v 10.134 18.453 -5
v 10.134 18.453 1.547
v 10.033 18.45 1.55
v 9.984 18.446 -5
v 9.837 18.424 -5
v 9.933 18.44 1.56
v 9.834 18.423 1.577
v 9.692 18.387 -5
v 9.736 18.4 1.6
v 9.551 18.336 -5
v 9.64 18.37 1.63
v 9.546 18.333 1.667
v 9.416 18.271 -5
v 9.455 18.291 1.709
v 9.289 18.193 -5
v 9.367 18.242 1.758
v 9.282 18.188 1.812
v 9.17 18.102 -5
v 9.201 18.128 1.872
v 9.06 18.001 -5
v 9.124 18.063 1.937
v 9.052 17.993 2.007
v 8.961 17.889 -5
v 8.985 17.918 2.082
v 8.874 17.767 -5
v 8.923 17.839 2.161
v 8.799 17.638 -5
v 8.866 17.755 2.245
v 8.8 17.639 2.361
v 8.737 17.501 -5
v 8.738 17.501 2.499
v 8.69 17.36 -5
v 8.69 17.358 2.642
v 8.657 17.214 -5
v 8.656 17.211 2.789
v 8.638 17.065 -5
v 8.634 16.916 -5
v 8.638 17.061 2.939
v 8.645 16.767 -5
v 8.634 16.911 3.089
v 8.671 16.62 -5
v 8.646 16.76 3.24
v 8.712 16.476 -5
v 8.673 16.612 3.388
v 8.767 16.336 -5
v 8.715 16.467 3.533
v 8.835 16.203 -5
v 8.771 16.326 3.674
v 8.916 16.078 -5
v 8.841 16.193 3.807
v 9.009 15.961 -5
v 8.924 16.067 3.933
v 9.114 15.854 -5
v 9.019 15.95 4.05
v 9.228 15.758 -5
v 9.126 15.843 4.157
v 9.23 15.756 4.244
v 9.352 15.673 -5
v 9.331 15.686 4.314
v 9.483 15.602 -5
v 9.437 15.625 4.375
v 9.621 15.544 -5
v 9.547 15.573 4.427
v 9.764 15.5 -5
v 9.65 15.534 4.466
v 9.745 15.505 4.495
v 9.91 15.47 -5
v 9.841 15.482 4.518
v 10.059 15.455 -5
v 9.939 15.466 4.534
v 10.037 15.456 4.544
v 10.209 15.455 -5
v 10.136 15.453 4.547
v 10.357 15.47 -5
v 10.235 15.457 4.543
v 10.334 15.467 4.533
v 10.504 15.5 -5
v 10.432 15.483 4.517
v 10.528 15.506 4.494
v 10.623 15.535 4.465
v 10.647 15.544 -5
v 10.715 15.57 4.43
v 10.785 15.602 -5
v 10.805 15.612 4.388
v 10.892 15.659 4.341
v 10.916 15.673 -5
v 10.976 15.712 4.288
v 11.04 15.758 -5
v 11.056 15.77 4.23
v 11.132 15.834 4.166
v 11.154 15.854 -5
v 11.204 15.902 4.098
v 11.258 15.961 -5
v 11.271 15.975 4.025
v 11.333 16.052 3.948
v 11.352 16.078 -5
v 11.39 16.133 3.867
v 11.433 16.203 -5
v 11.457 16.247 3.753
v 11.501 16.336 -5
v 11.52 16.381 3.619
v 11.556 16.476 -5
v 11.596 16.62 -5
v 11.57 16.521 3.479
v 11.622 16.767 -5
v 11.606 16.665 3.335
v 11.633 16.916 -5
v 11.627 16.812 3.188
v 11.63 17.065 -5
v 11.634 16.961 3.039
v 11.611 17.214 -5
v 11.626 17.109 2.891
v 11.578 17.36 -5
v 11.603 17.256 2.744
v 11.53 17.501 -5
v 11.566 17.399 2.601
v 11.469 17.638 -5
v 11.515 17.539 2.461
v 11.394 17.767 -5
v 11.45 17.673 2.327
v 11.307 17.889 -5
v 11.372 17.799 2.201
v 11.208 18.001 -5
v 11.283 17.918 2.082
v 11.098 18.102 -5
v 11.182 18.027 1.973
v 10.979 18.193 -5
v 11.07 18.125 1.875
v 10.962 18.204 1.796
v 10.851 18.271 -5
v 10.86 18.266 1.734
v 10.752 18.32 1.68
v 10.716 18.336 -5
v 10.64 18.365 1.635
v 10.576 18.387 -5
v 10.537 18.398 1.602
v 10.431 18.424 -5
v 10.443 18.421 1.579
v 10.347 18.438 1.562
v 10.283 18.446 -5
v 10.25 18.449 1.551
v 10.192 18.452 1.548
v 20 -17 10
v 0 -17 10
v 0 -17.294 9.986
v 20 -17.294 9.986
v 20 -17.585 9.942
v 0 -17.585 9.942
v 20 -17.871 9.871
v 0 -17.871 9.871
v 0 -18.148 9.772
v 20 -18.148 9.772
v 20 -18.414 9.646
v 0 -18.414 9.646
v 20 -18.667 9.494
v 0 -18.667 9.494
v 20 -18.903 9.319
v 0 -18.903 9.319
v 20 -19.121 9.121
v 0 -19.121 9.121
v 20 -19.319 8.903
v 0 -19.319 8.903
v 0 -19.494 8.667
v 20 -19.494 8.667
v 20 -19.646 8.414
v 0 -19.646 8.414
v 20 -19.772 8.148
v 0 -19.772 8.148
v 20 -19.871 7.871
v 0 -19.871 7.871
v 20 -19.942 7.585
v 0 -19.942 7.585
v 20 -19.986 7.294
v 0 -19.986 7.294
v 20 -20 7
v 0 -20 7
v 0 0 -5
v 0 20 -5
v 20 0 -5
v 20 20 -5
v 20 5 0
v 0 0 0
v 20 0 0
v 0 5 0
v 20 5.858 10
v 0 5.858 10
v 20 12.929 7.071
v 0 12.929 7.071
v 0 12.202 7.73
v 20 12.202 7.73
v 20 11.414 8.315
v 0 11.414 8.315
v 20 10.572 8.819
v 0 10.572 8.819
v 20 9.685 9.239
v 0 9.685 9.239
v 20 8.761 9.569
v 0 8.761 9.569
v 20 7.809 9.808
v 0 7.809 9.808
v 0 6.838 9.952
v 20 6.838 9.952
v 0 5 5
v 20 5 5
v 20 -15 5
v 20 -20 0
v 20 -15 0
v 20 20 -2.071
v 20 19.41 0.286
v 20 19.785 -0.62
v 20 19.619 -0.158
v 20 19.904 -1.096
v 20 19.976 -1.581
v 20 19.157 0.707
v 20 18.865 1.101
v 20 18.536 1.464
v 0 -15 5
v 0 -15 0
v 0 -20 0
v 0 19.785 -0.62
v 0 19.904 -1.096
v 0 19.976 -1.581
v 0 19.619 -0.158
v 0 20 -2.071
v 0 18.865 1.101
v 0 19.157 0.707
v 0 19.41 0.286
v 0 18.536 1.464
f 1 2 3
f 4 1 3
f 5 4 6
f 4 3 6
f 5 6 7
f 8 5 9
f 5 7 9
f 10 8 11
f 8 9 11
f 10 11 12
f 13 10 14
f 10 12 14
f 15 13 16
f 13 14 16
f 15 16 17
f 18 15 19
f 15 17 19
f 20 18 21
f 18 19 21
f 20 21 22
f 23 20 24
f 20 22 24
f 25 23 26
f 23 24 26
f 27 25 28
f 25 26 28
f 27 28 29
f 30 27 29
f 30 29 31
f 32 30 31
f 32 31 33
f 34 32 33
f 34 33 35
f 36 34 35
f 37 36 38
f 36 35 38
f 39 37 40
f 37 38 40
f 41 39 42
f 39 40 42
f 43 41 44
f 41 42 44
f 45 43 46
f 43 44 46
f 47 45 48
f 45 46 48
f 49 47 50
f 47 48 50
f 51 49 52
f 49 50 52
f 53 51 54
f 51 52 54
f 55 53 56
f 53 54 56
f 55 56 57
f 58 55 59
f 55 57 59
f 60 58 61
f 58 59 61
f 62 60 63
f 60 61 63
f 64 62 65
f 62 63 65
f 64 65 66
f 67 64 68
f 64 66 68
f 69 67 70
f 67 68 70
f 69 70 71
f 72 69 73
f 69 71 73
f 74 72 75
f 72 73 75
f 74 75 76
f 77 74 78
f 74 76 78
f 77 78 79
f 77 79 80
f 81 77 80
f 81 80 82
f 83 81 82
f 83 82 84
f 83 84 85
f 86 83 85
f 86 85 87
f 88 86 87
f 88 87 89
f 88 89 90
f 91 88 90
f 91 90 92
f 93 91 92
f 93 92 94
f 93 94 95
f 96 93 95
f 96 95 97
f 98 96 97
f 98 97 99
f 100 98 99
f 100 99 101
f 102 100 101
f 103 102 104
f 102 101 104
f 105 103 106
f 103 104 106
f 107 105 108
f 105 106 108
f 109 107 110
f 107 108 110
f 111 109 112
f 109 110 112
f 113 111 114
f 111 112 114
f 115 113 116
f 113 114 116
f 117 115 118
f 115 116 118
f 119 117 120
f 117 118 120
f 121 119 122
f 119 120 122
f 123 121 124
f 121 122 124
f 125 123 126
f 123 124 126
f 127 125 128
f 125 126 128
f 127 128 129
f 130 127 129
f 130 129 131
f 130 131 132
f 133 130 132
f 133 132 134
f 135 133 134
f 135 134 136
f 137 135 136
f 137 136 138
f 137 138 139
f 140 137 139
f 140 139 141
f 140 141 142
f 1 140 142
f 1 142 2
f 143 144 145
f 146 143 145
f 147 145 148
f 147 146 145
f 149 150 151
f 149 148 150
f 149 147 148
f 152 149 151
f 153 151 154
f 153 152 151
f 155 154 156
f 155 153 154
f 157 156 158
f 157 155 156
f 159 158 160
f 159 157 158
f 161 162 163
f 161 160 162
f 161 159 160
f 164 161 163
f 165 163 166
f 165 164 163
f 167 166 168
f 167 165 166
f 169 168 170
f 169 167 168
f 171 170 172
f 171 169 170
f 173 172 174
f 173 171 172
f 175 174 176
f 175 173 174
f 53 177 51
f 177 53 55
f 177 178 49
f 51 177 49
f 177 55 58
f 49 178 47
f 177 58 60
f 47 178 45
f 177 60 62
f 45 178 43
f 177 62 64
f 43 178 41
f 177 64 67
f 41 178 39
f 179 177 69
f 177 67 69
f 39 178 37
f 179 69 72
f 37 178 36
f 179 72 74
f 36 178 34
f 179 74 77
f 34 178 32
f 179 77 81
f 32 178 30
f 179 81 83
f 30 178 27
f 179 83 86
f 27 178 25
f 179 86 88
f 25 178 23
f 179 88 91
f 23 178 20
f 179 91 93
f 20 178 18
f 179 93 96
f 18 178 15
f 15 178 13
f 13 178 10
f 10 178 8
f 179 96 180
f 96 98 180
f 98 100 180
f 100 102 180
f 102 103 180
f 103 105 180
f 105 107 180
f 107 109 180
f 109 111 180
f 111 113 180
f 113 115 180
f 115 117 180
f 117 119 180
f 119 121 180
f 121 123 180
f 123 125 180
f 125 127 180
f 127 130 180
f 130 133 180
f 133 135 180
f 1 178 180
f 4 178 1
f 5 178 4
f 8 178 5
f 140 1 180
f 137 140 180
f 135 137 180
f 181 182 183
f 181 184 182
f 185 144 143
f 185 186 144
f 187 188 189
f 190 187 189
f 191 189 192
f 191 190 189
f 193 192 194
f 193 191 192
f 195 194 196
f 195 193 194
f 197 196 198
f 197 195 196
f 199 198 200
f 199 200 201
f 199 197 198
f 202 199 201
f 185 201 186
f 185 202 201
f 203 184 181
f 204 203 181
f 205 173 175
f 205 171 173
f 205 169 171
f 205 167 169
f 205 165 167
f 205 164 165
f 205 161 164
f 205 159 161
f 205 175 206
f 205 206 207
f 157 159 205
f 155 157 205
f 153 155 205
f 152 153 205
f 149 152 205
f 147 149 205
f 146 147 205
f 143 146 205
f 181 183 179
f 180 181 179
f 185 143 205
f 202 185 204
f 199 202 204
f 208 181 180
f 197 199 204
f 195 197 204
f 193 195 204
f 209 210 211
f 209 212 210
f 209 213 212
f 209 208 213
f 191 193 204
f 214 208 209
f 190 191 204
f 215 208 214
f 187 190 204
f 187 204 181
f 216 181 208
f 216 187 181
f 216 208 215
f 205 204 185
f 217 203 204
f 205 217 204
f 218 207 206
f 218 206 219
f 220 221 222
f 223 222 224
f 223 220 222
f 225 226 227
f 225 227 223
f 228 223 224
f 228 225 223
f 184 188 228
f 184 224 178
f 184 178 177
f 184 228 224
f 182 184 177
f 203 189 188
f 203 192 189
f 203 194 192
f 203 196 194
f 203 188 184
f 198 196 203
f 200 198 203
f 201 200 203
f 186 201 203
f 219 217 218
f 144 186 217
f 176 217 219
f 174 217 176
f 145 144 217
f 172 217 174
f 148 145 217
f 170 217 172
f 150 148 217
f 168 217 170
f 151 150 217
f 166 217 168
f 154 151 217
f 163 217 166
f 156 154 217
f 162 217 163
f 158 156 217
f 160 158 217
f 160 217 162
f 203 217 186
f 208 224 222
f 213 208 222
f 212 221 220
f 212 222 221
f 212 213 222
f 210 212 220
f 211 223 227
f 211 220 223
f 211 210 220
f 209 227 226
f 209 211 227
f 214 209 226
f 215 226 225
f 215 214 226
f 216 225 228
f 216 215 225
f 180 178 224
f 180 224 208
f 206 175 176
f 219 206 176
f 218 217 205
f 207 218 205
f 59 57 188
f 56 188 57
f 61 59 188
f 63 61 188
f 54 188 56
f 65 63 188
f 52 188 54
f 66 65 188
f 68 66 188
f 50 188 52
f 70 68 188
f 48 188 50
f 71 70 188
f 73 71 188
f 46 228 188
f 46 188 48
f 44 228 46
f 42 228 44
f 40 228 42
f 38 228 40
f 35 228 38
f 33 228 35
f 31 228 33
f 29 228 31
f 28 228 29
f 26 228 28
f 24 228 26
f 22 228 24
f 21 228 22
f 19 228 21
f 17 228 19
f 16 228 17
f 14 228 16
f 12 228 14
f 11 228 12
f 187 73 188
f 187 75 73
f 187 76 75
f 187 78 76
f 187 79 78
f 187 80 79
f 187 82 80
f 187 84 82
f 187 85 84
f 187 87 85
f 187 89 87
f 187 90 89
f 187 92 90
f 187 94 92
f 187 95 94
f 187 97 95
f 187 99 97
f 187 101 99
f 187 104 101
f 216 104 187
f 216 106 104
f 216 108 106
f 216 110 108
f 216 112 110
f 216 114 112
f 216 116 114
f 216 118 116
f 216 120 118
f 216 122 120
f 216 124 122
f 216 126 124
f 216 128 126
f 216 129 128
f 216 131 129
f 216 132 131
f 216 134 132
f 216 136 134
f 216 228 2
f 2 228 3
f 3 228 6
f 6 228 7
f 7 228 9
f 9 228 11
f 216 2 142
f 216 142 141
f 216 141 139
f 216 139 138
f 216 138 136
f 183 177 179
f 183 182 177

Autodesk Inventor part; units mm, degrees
ref_plane "YZ Plane" through (0, 0, 0) normal (1, 0, 0) x (0, 1, 0)
ref_plane "XZ Plane" through (0, 0, 0) normal (0, 1, 0) x (-1, 0, 0)
ref_plane "XY Plane" through (0, 0, 0) normal (0, 0, 1) x (1, 0, 0)
sketch "Szkic1" plane through (0, 0, 0) normal (0, 0, 1) x (1, 0, 0)
  line L0 (0, 0) -> (20, 0)
  line L1 (20, 0) -> (20, 20)
  line L2 (20, 20) -> (0, 20)
  line L3 (0, 20) -> (0, 0)
  dimension "d0" = 20
  dimension "d1" = 20
extrude "Wyciągnięcie proste1" add sketch "Szkic1" against normal blind 5
sketch "Szkic2" plane through (0, 0, 0) normal (0, 0, 1) x (1, 0, 0)
  line L0 (0, 0) -> (0, 20) projected
  line L1 (0, 20) -> (0, 5)
  line L2 (0, 5) -> (20, 5)
  line L3 (20, 20) -> (20, 0) projected
  line L4 (20, 5) -> (20, 20)
  line L5 (0, 20) -> (20, 20) projected
  line L6 (20, 20) -> (0, 20)
  dimension "d4" = 15
extrude "Wyciągnięcie proste2" add sketch "Szkic2" along normal blind 5
sketch "Szkic3" plane through (0, 0, 5) normal (0, 0, 1) x (1, 0, 0)
  line L0 (0, 20) -> (20, 20) projected
  line L1 (0, 20) -> (0, -25)
  line L2 (0, -25) -> (20, -25)
  line L3 (20, 20) -> (20, 0) projected
  line L4 (20, -25) -> (20, 20)
  line L5 (20, 20) -> (0, 20)
  point P0 (0, 0)
  dimension "d7" = 45
extrude "Wyciągnięcie proste3" add sketch "Szkic3" along normal blind 5
sketch "Szkic4" plane through (0, 0, 10) normal (0, 0, 1) x (1, 0, 0)
  line L0 (0, -25) -> (0, -20)
  line L1 (0, 5) -> (0, -25) projected
  line L2 (0, -20) -> (20, -20)
  line L3 (20, -25) -> (20, 5) projected
  line L4 (0, -25) -> (20, -25) projected
  line L5 (20, -25) -> (0, -25)
  point P0 (0, 0)
  dimension "d10" = 5
extrude "Wyciągnięcie proste4" cut sketch "Szkic4" against normal blind 10
sketch "Szkic5" plane through (0, 0, 5) normal (0, 0, -1) x (-1, 0, 0)
  line L0 (0, 20) -> (0, -20) projected
  line L1 (0, -20) -> (0, -15)
  line L2 (0, -15) -> (-20, -15)
  line L3 (-20, -20) -> (-20, 20) projected
  line L4 (-20, -20) -> (0, -20)
  point P0 (0, 0)
extrude "Wyciągnięcie proste5" add sketch "Szkic5" along normal blind 5
fillet "Zaokrąglenie1" radius 3 1 edges at (10, -20, 10)
chamfer "Faza1" distance 10 angle 45 1 edges at (10, 20, 10)
fillet "Zaokrąglenie2" radius 5 1 edges at (10, 20, 0)
fillet "Zaokrąglenie3" radius 10 1 edges at (10, 10, 10)
sketch "Szkic6" plane through (0, 0, -5) normal (0, 0, -1) x (-1, 0, 0)
  point P0 (0, 0)
  point P1 (-10.1338, 16.9533)
hole "Otwór1" at (10.1338, 16.9533, -5) direction (0, 0, 1) diameter 3 end through all
properties part number "Otwieracz do butelek"
